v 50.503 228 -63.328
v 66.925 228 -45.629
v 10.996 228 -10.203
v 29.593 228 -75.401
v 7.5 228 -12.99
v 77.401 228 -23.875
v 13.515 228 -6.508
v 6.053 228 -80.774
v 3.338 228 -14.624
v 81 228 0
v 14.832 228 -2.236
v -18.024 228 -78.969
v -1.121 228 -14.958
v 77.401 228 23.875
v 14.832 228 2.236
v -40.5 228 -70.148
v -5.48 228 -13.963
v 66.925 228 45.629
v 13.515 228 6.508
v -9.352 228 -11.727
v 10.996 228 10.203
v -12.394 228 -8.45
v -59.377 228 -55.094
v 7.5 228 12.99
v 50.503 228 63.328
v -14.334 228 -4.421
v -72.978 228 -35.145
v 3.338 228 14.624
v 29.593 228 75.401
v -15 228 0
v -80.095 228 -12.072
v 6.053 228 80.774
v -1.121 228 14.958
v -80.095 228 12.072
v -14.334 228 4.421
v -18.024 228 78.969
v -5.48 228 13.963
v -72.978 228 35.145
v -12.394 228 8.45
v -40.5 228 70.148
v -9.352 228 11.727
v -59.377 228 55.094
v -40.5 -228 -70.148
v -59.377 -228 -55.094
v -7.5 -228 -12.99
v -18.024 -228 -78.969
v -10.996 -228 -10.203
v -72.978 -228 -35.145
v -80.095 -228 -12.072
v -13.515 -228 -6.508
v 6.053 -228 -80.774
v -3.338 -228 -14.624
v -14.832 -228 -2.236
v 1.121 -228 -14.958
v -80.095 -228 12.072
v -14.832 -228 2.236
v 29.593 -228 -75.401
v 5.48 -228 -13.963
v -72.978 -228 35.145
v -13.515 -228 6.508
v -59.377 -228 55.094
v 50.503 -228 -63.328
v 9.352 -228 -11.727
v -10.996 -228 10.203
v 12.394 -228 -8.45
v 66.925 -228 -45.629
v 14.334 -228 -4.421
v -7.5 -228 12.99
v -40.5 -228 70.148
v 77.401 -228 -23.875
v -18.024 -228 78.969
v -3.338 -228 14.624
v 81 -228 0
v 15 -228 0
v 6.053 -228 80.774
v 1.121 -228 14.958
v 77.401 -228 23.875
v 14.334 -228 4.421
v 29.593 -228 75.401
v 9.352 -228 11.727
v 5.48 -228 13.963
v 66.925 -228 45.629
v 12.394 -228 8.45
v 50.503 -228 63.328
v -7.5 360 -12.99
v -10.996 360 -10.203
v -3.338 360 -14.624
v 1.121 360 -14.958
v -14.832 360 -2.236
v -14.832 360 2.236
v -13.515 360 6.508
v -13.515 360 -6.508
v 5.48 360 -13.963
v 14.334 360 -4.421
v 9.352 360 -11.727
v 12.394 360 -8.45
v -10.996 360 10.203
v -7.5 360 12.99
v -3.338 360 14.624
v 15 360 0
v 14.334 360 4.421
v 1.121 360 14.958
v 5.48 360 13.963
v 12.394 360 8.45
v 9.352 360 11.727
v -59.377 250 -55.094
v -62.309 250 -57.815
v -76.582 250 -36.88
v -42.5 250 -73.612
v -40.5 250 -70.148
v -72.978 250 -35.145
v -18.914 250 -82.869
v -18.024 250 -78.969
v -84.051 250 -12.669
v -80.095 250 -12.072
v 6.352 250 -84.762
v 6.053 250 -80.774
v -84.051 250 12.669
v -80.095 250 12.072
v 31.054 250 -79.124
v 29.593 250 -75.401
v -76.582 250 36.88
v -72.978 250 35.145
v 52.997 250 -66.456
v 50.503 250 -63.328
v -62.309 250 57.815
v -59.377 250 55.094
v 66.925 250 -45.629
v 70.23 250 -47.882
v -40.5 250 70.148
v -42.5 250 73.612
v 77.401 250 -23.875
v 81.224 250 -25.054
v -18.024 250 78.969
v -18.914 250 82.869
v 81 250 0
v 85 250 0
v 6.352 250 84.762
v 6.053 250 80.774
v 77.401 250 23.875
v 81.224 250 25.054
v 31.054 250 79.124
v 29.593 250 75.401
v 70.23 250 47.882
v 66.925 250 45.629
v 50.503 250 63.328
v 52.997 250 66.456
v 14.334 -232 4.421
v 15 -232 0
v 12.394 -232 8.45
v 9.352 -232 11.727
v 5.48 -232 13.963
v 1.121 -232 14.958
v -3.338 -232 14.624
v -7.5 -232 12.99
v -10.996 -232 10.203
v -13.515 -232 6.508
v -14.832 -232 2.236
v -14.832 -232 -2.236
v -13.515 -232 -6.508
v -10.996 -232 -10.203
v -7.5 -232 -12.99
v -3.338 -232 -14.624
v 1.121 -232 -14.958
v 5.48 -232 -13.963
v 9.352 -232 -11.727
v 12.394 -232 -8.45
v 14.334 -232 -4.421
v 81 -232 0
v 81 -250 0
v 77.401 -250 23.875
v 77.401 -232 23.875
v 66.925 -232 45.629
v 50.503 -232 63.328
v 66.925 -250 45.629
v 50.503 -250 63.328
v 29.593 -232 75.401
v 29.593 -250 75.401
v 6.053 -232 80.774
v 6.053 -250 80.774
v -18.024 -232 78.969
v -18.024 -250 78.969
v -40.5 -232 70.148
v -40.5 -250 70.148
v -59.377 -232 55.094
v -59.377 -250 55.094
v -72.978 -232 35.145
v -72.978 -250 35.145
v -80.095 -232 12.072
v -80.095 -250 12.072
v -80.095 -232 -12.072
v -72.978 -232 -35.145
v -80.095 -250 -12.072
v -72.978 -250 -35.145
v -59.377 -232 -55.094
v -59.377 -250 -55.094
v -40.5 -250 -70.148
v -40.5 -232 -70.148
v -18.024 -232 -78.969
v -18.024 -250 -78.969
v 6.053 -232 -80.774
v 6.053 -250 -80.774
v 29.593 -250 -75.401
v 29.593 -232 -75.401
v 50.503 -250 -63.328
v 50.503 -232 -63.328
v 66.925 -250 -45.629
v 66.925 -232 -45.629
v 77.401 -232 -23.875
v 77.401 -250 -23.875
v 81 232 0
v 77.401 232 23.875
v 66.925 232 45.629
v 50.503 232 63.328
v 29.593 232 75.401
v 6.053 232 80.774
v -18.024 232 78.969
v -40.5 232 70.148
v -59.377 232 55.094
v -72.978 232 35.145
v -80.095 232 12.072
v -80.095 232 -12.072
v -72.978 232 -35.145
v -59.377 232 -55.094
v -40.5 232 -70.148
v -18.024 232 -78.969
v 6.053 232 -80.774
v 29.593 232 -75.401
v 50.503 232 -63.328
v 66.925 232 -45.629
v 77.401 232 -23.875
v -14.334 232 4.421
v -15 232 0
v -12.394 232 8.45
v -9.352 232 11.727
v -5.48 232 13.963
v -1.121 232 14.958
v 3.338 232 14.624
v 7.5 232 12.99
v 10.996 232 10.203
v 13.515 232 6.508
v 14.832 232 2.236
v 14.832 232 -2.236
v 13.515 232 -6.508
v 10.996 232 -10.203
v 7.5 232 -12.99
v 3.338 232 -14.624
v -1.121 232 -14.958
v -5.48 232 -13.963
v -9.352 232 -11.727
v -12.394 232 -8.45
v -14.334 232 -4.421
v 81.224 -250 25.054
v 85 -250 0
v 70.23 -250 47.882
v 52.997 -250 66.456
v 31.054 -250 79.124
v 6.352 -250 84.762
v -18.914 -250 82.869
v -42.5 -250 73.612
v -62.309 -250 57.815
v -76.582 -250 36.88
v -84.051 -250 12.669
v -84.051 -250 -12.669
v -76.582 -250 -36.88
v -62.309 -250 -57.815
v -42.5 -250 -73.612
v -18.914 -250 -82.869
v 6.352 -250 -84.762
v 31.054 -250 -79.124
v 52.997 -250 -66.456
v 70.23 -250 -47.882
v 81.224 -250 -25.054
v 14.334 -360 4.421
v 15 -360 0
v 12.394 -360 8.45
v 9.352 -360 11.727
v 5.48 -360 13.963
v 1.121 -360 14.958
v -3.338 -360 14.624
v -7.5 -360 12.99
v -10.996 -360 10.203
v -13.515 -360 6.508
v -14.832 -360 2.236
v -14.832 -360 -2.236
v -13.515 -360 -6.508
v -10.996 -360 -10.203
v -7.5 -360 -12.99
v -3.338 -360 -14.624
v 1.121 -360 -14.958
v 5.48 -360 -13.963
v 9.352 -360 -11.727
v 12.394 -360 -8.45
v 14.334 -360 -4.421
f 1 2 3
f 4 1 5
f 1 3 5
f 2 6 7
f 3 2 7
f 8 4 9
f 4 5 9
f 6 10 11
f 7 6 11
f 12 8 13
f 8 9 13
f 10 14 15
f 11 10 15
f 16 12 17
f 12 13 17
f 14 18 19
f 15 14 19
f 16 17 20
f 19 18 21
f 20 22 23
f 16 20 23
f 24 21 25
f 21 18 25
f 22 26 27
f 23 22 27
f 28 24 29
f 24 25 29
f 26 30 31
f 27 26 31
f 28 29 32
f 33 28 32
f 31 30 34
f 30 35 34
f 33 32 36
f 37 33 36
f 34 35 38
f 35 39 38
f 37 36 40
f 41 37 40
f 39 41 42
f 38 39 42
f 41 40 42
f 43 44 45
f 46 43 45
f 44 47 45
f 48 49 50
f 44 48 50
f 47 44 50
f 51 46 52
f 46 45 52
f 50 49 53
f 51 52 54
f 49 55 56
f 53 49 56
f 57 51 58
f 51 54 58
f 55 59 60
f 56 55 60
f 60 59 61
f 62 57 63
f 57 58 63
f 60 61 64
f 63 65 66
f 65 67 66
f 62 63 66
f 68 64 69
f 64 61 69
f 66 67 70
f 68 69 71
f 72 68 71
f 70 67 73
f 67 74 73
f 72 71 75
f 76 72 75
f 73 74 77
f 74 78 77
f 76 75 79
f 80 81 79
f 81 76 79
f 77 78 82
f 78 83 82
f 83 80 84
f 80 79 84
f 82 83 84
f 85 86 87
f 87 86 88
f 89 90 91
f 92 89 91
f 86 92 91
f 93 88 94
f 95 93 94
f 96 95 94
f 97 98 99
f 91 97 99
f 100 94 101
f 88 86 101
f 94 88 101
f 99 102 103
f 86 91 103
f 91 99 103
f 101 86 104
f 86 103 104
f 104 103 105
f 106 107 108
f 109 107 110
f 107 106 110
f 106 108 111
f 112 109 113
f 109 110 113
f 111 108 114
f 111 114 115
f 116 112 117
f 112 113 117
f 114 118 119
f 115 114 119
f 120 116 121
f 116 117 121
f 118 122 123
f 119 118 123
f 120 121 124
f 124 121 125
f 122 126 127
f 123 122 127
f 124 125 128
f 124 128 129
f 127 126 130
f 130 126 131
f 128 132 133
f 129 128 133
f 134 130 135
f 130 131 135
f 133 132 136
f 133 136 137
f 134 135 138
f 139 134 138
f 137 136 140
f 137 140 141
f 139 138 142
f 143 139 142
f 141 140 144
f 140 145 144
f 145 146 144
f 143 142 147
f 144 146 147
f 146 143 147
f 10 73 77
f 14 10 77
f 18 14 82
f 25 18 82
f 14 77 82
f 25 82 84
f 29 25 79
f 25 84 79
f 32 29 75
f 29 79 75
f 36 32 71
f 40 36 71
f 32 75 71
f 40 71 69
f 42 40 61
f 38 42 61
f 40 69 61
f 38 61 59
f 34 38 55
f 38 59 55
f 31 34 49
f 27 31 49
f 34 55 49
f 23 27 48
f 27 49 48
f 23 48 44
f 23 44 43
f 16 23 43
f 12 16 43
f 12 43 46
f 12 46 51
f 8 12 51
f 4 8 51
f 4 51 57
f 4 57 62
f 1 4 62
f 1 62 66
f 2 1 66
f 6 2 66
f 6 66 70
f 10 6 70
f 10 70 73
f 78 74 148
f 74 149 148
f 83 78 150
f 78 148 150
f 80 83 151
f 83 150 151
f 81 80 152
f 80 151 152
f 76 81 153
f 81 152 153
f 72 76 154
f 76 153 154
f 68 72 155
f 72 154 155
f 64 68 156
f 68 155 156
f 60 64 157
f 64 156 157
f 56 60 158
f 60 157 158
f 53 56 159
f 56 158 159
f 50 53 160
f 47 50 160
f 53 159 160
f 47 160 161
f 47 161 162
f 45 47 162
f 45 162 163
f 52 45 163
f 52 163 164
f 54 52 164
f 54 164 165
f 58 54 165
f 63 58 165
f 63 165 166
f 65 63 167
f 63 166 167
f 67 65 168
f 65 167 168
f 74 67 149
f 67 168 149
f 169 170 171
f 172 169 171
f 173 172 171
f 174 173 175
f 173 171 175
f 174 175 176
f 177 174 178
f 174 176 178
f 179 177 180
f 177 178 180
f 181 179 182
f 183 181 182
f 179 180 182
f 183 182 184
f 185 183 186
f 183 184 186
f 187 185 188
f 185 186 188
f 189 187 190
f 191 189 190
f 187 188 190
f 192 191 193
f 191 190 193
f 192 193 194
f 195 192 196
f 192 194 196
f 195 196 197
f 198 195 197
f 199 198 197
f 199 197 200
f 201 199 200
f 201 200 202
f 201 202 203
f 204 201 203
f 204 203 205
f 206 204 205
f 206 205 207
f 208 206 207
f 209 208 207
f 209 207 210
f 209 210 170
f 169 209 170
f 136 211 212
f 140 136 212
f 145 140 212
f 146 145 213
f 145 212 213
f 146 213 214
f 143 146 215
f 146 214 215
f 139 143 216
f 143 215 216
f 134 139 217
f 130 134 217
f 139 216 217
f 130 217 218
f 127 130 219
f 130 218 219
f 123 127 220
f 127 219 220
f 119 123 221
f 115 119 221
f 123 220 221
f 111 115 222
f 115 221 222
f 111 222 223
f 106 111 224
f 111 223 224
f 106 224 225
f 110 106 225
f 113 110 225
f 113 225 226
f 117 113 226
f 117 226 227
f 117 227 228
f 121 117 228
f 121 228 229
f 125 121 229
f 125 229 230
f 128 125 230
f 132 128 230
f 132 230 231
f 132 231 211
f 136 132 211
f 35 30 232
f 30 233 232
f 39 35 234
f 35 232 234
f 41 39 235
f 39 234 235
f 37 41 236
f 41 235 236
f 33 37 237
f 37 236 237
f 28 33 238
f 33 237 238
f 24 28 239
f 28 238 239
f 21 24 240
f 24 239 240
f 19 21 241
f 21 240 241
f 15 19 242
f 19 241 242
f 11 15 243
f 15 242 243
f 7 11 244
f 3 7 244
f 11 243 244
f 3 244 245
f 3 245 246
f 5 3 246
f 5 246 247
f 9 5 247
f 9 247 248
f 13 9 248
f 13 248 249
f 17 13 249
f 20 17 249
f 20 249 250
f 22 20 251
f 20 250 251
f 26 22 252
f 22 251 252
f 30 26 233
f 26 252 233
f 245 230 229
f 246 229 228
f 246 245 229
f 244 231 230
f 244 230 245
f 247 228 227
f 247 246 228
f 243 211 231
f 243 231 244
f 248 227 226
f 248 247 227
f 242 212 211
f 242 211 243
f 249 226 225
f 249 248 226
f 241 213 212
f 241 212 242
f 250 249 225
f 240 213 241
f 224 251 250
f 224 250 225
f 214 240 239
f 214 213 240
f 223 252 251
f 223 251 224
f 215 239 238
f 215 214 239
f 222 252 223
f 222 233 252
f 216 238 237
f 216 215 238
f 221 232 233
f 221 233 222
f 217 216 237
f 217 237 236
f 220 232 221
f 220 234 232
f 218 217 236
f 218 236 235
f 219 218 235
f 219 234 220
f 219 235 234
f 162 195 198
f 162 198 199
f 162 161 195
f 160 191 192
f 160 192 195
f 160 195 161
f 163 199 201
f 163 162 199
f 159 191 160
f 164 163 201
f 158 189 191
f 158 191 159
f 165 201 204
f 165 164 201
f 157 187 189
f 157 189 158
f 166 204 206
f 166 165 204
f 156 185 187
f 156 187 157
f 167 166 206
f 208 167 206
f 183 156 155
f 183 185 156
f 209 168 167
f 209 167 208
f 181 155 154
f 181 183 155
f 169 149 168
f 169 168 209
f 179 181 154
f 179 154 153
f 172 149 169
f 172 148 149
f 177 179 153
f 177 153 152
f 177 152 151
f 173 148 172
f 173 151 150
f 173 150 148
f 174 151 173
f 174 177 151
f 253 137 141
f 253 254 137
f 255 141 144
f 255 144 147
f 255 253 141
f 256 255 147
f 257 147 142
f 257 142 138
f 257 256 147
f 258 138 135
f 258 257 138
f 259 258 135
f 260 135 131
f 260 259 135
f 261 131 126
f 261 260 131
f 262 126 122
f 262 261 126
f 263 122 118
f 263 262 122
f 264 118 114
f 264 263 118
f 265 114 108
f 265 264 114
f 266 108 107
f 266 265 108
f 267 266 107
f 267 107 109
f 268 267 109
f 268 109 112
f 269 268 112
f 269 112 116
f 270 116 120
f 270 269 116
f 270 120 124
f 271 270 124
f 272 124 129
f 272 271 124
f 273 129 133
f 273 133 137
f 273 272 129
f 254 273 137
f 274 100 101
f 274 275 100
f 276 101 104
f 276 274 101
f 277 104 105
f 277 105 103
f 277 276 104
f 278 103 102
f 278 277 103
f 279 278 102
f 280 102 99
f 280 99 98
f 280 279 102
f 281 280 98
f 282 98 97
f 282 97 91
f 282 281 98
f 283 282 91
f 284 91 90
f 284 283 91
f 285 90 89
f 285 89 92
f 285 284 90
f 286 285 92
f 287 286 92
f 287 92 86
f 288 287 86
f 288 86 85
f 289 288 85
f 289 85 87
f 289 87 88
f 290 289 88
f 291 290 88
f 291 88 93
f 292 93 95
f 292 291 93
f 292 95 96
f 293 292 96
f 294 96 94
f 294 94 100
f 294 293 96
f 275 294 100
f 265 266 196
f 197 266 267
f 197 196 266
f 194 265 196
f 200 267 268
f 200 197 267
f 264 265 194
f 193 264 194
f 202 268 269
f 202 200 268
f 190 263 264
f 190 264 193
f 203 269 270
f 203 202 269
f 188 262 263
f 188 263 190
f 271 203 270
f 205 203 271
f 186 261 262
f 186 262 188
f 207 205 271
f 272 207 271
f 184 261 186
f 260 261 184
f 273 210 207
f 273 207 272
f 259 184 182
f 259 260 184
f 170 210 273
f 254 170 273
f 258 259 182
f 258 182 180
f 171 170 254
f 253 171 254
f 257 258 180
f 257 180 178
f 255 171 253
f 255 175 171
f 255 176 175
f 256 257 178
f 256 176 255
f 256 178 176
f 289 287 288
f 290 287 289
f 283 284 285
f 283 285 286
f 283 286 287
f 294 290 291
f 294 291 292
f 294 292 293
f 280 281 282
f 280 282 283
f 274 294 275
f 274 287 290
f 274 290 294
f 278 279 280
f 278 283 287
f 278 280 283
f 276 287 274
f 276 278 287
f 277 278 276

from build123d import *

# Parameters (mm, degrees)
F0_R           = 15
F1_DEPTH       = 360
F1_DEPTH_BACK  = 360
F2_R           = 85
F3_DEPTH       = 250
F3_DEPTH_BACK  = 250
F4_R           = 81
F5_DEPTH       = 610.001
F7_R           = 81
F8_DEPTH       = 2
F8_DEPTH_BACK  = 2
F9_R           = 15
F10_DEPTH      = 4
F10_DEPTH_BACK = 4
F12_R          = 81
F13_DEPTH      = 2
F13_DEPTH_BACK = 2
F14_R          = 15
F15_DEPTH      = 25
F15_DEPTH_BACK = 25


with BuildPart() as f1:
    # F0 (on Front) → F1 (new body, two sides)
    with BuildSketch(Plane.XZ) as f1_sk:
        Circle(F0_R)
    extrude(amount=F1_DEPTH)
    extrude(f1_sk.sketch, amount=-F1_DEPTH_BACK)


with BuildPart() as f3:
    # F2 (on Front) → F3 (new body, two sides)
    with BuildSketch(Plane.XZ) as f3_sk:
        Circle(F2_R)
    extrude(amount=F3_DEPTH)
    extrude(f3_sk.sketch, amount=-F3_DEPTH_BACK)

    # F4 (on face) → F5 (cut, through all)
    with BuildSketch(Plane.XZ.offset(250)):
        Circle(F4_R)
    extrude(amount=-F5_DEPTH, mode=Mode.SUBTRACT)

    # F7 (on offset) → F8 (join, two sides)
    with BuildSketch(Plane.XZ.offset(230)) as f8_sk:
        Circle(F7_R)
    extrude(amount=F8_DEPTH)
    extrude(f8_sk.sketch, amount=-F8_DEPTH_BACK)

    # F9 (on offset) → F10 (cut, two sides)
    with BuildSketch(Plane.XZ.offset(230)) as f10_sk:
        Circle(F9_R)
    extrude(amount=-F10_DEPTH, mode=Mode.SUBTRACT)
    extrude(f10_sk.sketch, amount=F10_DEPTH_BACK, mode=Mode.SUBTRACT)

    # F12 (on offset) → F13 (join, two sides)
    with BuildSketch(Plane(origin=(0, 230, 0), x_dir=(-1, 0, 0), z_dir=(0, 1, 0))) as f13_sk:
        Circle(F12_R)
    extrude(amount=F13_DEPTH)
    extrude(f13_sk.sketch, amount=-F13_DEPTH_BACK)

    # F14 (on offset) → F15 (cut, two sides)
    with BuildSketch(Plane(origin=(0, 230, 0), x_dir=(-1, 0, 0), z_dir=(0, 1, 0))) as f15_sk:
        Circle(F14_R)
    extrude(amount=F15_DEPTH, mode=Mode.SUBTRACT)
    extrude(f15_sk.sketch, amount=-F15_DEPTH_BACK, mode=Mode.SUBTRACT)


solid = Compound([f1.part, f3.part])
